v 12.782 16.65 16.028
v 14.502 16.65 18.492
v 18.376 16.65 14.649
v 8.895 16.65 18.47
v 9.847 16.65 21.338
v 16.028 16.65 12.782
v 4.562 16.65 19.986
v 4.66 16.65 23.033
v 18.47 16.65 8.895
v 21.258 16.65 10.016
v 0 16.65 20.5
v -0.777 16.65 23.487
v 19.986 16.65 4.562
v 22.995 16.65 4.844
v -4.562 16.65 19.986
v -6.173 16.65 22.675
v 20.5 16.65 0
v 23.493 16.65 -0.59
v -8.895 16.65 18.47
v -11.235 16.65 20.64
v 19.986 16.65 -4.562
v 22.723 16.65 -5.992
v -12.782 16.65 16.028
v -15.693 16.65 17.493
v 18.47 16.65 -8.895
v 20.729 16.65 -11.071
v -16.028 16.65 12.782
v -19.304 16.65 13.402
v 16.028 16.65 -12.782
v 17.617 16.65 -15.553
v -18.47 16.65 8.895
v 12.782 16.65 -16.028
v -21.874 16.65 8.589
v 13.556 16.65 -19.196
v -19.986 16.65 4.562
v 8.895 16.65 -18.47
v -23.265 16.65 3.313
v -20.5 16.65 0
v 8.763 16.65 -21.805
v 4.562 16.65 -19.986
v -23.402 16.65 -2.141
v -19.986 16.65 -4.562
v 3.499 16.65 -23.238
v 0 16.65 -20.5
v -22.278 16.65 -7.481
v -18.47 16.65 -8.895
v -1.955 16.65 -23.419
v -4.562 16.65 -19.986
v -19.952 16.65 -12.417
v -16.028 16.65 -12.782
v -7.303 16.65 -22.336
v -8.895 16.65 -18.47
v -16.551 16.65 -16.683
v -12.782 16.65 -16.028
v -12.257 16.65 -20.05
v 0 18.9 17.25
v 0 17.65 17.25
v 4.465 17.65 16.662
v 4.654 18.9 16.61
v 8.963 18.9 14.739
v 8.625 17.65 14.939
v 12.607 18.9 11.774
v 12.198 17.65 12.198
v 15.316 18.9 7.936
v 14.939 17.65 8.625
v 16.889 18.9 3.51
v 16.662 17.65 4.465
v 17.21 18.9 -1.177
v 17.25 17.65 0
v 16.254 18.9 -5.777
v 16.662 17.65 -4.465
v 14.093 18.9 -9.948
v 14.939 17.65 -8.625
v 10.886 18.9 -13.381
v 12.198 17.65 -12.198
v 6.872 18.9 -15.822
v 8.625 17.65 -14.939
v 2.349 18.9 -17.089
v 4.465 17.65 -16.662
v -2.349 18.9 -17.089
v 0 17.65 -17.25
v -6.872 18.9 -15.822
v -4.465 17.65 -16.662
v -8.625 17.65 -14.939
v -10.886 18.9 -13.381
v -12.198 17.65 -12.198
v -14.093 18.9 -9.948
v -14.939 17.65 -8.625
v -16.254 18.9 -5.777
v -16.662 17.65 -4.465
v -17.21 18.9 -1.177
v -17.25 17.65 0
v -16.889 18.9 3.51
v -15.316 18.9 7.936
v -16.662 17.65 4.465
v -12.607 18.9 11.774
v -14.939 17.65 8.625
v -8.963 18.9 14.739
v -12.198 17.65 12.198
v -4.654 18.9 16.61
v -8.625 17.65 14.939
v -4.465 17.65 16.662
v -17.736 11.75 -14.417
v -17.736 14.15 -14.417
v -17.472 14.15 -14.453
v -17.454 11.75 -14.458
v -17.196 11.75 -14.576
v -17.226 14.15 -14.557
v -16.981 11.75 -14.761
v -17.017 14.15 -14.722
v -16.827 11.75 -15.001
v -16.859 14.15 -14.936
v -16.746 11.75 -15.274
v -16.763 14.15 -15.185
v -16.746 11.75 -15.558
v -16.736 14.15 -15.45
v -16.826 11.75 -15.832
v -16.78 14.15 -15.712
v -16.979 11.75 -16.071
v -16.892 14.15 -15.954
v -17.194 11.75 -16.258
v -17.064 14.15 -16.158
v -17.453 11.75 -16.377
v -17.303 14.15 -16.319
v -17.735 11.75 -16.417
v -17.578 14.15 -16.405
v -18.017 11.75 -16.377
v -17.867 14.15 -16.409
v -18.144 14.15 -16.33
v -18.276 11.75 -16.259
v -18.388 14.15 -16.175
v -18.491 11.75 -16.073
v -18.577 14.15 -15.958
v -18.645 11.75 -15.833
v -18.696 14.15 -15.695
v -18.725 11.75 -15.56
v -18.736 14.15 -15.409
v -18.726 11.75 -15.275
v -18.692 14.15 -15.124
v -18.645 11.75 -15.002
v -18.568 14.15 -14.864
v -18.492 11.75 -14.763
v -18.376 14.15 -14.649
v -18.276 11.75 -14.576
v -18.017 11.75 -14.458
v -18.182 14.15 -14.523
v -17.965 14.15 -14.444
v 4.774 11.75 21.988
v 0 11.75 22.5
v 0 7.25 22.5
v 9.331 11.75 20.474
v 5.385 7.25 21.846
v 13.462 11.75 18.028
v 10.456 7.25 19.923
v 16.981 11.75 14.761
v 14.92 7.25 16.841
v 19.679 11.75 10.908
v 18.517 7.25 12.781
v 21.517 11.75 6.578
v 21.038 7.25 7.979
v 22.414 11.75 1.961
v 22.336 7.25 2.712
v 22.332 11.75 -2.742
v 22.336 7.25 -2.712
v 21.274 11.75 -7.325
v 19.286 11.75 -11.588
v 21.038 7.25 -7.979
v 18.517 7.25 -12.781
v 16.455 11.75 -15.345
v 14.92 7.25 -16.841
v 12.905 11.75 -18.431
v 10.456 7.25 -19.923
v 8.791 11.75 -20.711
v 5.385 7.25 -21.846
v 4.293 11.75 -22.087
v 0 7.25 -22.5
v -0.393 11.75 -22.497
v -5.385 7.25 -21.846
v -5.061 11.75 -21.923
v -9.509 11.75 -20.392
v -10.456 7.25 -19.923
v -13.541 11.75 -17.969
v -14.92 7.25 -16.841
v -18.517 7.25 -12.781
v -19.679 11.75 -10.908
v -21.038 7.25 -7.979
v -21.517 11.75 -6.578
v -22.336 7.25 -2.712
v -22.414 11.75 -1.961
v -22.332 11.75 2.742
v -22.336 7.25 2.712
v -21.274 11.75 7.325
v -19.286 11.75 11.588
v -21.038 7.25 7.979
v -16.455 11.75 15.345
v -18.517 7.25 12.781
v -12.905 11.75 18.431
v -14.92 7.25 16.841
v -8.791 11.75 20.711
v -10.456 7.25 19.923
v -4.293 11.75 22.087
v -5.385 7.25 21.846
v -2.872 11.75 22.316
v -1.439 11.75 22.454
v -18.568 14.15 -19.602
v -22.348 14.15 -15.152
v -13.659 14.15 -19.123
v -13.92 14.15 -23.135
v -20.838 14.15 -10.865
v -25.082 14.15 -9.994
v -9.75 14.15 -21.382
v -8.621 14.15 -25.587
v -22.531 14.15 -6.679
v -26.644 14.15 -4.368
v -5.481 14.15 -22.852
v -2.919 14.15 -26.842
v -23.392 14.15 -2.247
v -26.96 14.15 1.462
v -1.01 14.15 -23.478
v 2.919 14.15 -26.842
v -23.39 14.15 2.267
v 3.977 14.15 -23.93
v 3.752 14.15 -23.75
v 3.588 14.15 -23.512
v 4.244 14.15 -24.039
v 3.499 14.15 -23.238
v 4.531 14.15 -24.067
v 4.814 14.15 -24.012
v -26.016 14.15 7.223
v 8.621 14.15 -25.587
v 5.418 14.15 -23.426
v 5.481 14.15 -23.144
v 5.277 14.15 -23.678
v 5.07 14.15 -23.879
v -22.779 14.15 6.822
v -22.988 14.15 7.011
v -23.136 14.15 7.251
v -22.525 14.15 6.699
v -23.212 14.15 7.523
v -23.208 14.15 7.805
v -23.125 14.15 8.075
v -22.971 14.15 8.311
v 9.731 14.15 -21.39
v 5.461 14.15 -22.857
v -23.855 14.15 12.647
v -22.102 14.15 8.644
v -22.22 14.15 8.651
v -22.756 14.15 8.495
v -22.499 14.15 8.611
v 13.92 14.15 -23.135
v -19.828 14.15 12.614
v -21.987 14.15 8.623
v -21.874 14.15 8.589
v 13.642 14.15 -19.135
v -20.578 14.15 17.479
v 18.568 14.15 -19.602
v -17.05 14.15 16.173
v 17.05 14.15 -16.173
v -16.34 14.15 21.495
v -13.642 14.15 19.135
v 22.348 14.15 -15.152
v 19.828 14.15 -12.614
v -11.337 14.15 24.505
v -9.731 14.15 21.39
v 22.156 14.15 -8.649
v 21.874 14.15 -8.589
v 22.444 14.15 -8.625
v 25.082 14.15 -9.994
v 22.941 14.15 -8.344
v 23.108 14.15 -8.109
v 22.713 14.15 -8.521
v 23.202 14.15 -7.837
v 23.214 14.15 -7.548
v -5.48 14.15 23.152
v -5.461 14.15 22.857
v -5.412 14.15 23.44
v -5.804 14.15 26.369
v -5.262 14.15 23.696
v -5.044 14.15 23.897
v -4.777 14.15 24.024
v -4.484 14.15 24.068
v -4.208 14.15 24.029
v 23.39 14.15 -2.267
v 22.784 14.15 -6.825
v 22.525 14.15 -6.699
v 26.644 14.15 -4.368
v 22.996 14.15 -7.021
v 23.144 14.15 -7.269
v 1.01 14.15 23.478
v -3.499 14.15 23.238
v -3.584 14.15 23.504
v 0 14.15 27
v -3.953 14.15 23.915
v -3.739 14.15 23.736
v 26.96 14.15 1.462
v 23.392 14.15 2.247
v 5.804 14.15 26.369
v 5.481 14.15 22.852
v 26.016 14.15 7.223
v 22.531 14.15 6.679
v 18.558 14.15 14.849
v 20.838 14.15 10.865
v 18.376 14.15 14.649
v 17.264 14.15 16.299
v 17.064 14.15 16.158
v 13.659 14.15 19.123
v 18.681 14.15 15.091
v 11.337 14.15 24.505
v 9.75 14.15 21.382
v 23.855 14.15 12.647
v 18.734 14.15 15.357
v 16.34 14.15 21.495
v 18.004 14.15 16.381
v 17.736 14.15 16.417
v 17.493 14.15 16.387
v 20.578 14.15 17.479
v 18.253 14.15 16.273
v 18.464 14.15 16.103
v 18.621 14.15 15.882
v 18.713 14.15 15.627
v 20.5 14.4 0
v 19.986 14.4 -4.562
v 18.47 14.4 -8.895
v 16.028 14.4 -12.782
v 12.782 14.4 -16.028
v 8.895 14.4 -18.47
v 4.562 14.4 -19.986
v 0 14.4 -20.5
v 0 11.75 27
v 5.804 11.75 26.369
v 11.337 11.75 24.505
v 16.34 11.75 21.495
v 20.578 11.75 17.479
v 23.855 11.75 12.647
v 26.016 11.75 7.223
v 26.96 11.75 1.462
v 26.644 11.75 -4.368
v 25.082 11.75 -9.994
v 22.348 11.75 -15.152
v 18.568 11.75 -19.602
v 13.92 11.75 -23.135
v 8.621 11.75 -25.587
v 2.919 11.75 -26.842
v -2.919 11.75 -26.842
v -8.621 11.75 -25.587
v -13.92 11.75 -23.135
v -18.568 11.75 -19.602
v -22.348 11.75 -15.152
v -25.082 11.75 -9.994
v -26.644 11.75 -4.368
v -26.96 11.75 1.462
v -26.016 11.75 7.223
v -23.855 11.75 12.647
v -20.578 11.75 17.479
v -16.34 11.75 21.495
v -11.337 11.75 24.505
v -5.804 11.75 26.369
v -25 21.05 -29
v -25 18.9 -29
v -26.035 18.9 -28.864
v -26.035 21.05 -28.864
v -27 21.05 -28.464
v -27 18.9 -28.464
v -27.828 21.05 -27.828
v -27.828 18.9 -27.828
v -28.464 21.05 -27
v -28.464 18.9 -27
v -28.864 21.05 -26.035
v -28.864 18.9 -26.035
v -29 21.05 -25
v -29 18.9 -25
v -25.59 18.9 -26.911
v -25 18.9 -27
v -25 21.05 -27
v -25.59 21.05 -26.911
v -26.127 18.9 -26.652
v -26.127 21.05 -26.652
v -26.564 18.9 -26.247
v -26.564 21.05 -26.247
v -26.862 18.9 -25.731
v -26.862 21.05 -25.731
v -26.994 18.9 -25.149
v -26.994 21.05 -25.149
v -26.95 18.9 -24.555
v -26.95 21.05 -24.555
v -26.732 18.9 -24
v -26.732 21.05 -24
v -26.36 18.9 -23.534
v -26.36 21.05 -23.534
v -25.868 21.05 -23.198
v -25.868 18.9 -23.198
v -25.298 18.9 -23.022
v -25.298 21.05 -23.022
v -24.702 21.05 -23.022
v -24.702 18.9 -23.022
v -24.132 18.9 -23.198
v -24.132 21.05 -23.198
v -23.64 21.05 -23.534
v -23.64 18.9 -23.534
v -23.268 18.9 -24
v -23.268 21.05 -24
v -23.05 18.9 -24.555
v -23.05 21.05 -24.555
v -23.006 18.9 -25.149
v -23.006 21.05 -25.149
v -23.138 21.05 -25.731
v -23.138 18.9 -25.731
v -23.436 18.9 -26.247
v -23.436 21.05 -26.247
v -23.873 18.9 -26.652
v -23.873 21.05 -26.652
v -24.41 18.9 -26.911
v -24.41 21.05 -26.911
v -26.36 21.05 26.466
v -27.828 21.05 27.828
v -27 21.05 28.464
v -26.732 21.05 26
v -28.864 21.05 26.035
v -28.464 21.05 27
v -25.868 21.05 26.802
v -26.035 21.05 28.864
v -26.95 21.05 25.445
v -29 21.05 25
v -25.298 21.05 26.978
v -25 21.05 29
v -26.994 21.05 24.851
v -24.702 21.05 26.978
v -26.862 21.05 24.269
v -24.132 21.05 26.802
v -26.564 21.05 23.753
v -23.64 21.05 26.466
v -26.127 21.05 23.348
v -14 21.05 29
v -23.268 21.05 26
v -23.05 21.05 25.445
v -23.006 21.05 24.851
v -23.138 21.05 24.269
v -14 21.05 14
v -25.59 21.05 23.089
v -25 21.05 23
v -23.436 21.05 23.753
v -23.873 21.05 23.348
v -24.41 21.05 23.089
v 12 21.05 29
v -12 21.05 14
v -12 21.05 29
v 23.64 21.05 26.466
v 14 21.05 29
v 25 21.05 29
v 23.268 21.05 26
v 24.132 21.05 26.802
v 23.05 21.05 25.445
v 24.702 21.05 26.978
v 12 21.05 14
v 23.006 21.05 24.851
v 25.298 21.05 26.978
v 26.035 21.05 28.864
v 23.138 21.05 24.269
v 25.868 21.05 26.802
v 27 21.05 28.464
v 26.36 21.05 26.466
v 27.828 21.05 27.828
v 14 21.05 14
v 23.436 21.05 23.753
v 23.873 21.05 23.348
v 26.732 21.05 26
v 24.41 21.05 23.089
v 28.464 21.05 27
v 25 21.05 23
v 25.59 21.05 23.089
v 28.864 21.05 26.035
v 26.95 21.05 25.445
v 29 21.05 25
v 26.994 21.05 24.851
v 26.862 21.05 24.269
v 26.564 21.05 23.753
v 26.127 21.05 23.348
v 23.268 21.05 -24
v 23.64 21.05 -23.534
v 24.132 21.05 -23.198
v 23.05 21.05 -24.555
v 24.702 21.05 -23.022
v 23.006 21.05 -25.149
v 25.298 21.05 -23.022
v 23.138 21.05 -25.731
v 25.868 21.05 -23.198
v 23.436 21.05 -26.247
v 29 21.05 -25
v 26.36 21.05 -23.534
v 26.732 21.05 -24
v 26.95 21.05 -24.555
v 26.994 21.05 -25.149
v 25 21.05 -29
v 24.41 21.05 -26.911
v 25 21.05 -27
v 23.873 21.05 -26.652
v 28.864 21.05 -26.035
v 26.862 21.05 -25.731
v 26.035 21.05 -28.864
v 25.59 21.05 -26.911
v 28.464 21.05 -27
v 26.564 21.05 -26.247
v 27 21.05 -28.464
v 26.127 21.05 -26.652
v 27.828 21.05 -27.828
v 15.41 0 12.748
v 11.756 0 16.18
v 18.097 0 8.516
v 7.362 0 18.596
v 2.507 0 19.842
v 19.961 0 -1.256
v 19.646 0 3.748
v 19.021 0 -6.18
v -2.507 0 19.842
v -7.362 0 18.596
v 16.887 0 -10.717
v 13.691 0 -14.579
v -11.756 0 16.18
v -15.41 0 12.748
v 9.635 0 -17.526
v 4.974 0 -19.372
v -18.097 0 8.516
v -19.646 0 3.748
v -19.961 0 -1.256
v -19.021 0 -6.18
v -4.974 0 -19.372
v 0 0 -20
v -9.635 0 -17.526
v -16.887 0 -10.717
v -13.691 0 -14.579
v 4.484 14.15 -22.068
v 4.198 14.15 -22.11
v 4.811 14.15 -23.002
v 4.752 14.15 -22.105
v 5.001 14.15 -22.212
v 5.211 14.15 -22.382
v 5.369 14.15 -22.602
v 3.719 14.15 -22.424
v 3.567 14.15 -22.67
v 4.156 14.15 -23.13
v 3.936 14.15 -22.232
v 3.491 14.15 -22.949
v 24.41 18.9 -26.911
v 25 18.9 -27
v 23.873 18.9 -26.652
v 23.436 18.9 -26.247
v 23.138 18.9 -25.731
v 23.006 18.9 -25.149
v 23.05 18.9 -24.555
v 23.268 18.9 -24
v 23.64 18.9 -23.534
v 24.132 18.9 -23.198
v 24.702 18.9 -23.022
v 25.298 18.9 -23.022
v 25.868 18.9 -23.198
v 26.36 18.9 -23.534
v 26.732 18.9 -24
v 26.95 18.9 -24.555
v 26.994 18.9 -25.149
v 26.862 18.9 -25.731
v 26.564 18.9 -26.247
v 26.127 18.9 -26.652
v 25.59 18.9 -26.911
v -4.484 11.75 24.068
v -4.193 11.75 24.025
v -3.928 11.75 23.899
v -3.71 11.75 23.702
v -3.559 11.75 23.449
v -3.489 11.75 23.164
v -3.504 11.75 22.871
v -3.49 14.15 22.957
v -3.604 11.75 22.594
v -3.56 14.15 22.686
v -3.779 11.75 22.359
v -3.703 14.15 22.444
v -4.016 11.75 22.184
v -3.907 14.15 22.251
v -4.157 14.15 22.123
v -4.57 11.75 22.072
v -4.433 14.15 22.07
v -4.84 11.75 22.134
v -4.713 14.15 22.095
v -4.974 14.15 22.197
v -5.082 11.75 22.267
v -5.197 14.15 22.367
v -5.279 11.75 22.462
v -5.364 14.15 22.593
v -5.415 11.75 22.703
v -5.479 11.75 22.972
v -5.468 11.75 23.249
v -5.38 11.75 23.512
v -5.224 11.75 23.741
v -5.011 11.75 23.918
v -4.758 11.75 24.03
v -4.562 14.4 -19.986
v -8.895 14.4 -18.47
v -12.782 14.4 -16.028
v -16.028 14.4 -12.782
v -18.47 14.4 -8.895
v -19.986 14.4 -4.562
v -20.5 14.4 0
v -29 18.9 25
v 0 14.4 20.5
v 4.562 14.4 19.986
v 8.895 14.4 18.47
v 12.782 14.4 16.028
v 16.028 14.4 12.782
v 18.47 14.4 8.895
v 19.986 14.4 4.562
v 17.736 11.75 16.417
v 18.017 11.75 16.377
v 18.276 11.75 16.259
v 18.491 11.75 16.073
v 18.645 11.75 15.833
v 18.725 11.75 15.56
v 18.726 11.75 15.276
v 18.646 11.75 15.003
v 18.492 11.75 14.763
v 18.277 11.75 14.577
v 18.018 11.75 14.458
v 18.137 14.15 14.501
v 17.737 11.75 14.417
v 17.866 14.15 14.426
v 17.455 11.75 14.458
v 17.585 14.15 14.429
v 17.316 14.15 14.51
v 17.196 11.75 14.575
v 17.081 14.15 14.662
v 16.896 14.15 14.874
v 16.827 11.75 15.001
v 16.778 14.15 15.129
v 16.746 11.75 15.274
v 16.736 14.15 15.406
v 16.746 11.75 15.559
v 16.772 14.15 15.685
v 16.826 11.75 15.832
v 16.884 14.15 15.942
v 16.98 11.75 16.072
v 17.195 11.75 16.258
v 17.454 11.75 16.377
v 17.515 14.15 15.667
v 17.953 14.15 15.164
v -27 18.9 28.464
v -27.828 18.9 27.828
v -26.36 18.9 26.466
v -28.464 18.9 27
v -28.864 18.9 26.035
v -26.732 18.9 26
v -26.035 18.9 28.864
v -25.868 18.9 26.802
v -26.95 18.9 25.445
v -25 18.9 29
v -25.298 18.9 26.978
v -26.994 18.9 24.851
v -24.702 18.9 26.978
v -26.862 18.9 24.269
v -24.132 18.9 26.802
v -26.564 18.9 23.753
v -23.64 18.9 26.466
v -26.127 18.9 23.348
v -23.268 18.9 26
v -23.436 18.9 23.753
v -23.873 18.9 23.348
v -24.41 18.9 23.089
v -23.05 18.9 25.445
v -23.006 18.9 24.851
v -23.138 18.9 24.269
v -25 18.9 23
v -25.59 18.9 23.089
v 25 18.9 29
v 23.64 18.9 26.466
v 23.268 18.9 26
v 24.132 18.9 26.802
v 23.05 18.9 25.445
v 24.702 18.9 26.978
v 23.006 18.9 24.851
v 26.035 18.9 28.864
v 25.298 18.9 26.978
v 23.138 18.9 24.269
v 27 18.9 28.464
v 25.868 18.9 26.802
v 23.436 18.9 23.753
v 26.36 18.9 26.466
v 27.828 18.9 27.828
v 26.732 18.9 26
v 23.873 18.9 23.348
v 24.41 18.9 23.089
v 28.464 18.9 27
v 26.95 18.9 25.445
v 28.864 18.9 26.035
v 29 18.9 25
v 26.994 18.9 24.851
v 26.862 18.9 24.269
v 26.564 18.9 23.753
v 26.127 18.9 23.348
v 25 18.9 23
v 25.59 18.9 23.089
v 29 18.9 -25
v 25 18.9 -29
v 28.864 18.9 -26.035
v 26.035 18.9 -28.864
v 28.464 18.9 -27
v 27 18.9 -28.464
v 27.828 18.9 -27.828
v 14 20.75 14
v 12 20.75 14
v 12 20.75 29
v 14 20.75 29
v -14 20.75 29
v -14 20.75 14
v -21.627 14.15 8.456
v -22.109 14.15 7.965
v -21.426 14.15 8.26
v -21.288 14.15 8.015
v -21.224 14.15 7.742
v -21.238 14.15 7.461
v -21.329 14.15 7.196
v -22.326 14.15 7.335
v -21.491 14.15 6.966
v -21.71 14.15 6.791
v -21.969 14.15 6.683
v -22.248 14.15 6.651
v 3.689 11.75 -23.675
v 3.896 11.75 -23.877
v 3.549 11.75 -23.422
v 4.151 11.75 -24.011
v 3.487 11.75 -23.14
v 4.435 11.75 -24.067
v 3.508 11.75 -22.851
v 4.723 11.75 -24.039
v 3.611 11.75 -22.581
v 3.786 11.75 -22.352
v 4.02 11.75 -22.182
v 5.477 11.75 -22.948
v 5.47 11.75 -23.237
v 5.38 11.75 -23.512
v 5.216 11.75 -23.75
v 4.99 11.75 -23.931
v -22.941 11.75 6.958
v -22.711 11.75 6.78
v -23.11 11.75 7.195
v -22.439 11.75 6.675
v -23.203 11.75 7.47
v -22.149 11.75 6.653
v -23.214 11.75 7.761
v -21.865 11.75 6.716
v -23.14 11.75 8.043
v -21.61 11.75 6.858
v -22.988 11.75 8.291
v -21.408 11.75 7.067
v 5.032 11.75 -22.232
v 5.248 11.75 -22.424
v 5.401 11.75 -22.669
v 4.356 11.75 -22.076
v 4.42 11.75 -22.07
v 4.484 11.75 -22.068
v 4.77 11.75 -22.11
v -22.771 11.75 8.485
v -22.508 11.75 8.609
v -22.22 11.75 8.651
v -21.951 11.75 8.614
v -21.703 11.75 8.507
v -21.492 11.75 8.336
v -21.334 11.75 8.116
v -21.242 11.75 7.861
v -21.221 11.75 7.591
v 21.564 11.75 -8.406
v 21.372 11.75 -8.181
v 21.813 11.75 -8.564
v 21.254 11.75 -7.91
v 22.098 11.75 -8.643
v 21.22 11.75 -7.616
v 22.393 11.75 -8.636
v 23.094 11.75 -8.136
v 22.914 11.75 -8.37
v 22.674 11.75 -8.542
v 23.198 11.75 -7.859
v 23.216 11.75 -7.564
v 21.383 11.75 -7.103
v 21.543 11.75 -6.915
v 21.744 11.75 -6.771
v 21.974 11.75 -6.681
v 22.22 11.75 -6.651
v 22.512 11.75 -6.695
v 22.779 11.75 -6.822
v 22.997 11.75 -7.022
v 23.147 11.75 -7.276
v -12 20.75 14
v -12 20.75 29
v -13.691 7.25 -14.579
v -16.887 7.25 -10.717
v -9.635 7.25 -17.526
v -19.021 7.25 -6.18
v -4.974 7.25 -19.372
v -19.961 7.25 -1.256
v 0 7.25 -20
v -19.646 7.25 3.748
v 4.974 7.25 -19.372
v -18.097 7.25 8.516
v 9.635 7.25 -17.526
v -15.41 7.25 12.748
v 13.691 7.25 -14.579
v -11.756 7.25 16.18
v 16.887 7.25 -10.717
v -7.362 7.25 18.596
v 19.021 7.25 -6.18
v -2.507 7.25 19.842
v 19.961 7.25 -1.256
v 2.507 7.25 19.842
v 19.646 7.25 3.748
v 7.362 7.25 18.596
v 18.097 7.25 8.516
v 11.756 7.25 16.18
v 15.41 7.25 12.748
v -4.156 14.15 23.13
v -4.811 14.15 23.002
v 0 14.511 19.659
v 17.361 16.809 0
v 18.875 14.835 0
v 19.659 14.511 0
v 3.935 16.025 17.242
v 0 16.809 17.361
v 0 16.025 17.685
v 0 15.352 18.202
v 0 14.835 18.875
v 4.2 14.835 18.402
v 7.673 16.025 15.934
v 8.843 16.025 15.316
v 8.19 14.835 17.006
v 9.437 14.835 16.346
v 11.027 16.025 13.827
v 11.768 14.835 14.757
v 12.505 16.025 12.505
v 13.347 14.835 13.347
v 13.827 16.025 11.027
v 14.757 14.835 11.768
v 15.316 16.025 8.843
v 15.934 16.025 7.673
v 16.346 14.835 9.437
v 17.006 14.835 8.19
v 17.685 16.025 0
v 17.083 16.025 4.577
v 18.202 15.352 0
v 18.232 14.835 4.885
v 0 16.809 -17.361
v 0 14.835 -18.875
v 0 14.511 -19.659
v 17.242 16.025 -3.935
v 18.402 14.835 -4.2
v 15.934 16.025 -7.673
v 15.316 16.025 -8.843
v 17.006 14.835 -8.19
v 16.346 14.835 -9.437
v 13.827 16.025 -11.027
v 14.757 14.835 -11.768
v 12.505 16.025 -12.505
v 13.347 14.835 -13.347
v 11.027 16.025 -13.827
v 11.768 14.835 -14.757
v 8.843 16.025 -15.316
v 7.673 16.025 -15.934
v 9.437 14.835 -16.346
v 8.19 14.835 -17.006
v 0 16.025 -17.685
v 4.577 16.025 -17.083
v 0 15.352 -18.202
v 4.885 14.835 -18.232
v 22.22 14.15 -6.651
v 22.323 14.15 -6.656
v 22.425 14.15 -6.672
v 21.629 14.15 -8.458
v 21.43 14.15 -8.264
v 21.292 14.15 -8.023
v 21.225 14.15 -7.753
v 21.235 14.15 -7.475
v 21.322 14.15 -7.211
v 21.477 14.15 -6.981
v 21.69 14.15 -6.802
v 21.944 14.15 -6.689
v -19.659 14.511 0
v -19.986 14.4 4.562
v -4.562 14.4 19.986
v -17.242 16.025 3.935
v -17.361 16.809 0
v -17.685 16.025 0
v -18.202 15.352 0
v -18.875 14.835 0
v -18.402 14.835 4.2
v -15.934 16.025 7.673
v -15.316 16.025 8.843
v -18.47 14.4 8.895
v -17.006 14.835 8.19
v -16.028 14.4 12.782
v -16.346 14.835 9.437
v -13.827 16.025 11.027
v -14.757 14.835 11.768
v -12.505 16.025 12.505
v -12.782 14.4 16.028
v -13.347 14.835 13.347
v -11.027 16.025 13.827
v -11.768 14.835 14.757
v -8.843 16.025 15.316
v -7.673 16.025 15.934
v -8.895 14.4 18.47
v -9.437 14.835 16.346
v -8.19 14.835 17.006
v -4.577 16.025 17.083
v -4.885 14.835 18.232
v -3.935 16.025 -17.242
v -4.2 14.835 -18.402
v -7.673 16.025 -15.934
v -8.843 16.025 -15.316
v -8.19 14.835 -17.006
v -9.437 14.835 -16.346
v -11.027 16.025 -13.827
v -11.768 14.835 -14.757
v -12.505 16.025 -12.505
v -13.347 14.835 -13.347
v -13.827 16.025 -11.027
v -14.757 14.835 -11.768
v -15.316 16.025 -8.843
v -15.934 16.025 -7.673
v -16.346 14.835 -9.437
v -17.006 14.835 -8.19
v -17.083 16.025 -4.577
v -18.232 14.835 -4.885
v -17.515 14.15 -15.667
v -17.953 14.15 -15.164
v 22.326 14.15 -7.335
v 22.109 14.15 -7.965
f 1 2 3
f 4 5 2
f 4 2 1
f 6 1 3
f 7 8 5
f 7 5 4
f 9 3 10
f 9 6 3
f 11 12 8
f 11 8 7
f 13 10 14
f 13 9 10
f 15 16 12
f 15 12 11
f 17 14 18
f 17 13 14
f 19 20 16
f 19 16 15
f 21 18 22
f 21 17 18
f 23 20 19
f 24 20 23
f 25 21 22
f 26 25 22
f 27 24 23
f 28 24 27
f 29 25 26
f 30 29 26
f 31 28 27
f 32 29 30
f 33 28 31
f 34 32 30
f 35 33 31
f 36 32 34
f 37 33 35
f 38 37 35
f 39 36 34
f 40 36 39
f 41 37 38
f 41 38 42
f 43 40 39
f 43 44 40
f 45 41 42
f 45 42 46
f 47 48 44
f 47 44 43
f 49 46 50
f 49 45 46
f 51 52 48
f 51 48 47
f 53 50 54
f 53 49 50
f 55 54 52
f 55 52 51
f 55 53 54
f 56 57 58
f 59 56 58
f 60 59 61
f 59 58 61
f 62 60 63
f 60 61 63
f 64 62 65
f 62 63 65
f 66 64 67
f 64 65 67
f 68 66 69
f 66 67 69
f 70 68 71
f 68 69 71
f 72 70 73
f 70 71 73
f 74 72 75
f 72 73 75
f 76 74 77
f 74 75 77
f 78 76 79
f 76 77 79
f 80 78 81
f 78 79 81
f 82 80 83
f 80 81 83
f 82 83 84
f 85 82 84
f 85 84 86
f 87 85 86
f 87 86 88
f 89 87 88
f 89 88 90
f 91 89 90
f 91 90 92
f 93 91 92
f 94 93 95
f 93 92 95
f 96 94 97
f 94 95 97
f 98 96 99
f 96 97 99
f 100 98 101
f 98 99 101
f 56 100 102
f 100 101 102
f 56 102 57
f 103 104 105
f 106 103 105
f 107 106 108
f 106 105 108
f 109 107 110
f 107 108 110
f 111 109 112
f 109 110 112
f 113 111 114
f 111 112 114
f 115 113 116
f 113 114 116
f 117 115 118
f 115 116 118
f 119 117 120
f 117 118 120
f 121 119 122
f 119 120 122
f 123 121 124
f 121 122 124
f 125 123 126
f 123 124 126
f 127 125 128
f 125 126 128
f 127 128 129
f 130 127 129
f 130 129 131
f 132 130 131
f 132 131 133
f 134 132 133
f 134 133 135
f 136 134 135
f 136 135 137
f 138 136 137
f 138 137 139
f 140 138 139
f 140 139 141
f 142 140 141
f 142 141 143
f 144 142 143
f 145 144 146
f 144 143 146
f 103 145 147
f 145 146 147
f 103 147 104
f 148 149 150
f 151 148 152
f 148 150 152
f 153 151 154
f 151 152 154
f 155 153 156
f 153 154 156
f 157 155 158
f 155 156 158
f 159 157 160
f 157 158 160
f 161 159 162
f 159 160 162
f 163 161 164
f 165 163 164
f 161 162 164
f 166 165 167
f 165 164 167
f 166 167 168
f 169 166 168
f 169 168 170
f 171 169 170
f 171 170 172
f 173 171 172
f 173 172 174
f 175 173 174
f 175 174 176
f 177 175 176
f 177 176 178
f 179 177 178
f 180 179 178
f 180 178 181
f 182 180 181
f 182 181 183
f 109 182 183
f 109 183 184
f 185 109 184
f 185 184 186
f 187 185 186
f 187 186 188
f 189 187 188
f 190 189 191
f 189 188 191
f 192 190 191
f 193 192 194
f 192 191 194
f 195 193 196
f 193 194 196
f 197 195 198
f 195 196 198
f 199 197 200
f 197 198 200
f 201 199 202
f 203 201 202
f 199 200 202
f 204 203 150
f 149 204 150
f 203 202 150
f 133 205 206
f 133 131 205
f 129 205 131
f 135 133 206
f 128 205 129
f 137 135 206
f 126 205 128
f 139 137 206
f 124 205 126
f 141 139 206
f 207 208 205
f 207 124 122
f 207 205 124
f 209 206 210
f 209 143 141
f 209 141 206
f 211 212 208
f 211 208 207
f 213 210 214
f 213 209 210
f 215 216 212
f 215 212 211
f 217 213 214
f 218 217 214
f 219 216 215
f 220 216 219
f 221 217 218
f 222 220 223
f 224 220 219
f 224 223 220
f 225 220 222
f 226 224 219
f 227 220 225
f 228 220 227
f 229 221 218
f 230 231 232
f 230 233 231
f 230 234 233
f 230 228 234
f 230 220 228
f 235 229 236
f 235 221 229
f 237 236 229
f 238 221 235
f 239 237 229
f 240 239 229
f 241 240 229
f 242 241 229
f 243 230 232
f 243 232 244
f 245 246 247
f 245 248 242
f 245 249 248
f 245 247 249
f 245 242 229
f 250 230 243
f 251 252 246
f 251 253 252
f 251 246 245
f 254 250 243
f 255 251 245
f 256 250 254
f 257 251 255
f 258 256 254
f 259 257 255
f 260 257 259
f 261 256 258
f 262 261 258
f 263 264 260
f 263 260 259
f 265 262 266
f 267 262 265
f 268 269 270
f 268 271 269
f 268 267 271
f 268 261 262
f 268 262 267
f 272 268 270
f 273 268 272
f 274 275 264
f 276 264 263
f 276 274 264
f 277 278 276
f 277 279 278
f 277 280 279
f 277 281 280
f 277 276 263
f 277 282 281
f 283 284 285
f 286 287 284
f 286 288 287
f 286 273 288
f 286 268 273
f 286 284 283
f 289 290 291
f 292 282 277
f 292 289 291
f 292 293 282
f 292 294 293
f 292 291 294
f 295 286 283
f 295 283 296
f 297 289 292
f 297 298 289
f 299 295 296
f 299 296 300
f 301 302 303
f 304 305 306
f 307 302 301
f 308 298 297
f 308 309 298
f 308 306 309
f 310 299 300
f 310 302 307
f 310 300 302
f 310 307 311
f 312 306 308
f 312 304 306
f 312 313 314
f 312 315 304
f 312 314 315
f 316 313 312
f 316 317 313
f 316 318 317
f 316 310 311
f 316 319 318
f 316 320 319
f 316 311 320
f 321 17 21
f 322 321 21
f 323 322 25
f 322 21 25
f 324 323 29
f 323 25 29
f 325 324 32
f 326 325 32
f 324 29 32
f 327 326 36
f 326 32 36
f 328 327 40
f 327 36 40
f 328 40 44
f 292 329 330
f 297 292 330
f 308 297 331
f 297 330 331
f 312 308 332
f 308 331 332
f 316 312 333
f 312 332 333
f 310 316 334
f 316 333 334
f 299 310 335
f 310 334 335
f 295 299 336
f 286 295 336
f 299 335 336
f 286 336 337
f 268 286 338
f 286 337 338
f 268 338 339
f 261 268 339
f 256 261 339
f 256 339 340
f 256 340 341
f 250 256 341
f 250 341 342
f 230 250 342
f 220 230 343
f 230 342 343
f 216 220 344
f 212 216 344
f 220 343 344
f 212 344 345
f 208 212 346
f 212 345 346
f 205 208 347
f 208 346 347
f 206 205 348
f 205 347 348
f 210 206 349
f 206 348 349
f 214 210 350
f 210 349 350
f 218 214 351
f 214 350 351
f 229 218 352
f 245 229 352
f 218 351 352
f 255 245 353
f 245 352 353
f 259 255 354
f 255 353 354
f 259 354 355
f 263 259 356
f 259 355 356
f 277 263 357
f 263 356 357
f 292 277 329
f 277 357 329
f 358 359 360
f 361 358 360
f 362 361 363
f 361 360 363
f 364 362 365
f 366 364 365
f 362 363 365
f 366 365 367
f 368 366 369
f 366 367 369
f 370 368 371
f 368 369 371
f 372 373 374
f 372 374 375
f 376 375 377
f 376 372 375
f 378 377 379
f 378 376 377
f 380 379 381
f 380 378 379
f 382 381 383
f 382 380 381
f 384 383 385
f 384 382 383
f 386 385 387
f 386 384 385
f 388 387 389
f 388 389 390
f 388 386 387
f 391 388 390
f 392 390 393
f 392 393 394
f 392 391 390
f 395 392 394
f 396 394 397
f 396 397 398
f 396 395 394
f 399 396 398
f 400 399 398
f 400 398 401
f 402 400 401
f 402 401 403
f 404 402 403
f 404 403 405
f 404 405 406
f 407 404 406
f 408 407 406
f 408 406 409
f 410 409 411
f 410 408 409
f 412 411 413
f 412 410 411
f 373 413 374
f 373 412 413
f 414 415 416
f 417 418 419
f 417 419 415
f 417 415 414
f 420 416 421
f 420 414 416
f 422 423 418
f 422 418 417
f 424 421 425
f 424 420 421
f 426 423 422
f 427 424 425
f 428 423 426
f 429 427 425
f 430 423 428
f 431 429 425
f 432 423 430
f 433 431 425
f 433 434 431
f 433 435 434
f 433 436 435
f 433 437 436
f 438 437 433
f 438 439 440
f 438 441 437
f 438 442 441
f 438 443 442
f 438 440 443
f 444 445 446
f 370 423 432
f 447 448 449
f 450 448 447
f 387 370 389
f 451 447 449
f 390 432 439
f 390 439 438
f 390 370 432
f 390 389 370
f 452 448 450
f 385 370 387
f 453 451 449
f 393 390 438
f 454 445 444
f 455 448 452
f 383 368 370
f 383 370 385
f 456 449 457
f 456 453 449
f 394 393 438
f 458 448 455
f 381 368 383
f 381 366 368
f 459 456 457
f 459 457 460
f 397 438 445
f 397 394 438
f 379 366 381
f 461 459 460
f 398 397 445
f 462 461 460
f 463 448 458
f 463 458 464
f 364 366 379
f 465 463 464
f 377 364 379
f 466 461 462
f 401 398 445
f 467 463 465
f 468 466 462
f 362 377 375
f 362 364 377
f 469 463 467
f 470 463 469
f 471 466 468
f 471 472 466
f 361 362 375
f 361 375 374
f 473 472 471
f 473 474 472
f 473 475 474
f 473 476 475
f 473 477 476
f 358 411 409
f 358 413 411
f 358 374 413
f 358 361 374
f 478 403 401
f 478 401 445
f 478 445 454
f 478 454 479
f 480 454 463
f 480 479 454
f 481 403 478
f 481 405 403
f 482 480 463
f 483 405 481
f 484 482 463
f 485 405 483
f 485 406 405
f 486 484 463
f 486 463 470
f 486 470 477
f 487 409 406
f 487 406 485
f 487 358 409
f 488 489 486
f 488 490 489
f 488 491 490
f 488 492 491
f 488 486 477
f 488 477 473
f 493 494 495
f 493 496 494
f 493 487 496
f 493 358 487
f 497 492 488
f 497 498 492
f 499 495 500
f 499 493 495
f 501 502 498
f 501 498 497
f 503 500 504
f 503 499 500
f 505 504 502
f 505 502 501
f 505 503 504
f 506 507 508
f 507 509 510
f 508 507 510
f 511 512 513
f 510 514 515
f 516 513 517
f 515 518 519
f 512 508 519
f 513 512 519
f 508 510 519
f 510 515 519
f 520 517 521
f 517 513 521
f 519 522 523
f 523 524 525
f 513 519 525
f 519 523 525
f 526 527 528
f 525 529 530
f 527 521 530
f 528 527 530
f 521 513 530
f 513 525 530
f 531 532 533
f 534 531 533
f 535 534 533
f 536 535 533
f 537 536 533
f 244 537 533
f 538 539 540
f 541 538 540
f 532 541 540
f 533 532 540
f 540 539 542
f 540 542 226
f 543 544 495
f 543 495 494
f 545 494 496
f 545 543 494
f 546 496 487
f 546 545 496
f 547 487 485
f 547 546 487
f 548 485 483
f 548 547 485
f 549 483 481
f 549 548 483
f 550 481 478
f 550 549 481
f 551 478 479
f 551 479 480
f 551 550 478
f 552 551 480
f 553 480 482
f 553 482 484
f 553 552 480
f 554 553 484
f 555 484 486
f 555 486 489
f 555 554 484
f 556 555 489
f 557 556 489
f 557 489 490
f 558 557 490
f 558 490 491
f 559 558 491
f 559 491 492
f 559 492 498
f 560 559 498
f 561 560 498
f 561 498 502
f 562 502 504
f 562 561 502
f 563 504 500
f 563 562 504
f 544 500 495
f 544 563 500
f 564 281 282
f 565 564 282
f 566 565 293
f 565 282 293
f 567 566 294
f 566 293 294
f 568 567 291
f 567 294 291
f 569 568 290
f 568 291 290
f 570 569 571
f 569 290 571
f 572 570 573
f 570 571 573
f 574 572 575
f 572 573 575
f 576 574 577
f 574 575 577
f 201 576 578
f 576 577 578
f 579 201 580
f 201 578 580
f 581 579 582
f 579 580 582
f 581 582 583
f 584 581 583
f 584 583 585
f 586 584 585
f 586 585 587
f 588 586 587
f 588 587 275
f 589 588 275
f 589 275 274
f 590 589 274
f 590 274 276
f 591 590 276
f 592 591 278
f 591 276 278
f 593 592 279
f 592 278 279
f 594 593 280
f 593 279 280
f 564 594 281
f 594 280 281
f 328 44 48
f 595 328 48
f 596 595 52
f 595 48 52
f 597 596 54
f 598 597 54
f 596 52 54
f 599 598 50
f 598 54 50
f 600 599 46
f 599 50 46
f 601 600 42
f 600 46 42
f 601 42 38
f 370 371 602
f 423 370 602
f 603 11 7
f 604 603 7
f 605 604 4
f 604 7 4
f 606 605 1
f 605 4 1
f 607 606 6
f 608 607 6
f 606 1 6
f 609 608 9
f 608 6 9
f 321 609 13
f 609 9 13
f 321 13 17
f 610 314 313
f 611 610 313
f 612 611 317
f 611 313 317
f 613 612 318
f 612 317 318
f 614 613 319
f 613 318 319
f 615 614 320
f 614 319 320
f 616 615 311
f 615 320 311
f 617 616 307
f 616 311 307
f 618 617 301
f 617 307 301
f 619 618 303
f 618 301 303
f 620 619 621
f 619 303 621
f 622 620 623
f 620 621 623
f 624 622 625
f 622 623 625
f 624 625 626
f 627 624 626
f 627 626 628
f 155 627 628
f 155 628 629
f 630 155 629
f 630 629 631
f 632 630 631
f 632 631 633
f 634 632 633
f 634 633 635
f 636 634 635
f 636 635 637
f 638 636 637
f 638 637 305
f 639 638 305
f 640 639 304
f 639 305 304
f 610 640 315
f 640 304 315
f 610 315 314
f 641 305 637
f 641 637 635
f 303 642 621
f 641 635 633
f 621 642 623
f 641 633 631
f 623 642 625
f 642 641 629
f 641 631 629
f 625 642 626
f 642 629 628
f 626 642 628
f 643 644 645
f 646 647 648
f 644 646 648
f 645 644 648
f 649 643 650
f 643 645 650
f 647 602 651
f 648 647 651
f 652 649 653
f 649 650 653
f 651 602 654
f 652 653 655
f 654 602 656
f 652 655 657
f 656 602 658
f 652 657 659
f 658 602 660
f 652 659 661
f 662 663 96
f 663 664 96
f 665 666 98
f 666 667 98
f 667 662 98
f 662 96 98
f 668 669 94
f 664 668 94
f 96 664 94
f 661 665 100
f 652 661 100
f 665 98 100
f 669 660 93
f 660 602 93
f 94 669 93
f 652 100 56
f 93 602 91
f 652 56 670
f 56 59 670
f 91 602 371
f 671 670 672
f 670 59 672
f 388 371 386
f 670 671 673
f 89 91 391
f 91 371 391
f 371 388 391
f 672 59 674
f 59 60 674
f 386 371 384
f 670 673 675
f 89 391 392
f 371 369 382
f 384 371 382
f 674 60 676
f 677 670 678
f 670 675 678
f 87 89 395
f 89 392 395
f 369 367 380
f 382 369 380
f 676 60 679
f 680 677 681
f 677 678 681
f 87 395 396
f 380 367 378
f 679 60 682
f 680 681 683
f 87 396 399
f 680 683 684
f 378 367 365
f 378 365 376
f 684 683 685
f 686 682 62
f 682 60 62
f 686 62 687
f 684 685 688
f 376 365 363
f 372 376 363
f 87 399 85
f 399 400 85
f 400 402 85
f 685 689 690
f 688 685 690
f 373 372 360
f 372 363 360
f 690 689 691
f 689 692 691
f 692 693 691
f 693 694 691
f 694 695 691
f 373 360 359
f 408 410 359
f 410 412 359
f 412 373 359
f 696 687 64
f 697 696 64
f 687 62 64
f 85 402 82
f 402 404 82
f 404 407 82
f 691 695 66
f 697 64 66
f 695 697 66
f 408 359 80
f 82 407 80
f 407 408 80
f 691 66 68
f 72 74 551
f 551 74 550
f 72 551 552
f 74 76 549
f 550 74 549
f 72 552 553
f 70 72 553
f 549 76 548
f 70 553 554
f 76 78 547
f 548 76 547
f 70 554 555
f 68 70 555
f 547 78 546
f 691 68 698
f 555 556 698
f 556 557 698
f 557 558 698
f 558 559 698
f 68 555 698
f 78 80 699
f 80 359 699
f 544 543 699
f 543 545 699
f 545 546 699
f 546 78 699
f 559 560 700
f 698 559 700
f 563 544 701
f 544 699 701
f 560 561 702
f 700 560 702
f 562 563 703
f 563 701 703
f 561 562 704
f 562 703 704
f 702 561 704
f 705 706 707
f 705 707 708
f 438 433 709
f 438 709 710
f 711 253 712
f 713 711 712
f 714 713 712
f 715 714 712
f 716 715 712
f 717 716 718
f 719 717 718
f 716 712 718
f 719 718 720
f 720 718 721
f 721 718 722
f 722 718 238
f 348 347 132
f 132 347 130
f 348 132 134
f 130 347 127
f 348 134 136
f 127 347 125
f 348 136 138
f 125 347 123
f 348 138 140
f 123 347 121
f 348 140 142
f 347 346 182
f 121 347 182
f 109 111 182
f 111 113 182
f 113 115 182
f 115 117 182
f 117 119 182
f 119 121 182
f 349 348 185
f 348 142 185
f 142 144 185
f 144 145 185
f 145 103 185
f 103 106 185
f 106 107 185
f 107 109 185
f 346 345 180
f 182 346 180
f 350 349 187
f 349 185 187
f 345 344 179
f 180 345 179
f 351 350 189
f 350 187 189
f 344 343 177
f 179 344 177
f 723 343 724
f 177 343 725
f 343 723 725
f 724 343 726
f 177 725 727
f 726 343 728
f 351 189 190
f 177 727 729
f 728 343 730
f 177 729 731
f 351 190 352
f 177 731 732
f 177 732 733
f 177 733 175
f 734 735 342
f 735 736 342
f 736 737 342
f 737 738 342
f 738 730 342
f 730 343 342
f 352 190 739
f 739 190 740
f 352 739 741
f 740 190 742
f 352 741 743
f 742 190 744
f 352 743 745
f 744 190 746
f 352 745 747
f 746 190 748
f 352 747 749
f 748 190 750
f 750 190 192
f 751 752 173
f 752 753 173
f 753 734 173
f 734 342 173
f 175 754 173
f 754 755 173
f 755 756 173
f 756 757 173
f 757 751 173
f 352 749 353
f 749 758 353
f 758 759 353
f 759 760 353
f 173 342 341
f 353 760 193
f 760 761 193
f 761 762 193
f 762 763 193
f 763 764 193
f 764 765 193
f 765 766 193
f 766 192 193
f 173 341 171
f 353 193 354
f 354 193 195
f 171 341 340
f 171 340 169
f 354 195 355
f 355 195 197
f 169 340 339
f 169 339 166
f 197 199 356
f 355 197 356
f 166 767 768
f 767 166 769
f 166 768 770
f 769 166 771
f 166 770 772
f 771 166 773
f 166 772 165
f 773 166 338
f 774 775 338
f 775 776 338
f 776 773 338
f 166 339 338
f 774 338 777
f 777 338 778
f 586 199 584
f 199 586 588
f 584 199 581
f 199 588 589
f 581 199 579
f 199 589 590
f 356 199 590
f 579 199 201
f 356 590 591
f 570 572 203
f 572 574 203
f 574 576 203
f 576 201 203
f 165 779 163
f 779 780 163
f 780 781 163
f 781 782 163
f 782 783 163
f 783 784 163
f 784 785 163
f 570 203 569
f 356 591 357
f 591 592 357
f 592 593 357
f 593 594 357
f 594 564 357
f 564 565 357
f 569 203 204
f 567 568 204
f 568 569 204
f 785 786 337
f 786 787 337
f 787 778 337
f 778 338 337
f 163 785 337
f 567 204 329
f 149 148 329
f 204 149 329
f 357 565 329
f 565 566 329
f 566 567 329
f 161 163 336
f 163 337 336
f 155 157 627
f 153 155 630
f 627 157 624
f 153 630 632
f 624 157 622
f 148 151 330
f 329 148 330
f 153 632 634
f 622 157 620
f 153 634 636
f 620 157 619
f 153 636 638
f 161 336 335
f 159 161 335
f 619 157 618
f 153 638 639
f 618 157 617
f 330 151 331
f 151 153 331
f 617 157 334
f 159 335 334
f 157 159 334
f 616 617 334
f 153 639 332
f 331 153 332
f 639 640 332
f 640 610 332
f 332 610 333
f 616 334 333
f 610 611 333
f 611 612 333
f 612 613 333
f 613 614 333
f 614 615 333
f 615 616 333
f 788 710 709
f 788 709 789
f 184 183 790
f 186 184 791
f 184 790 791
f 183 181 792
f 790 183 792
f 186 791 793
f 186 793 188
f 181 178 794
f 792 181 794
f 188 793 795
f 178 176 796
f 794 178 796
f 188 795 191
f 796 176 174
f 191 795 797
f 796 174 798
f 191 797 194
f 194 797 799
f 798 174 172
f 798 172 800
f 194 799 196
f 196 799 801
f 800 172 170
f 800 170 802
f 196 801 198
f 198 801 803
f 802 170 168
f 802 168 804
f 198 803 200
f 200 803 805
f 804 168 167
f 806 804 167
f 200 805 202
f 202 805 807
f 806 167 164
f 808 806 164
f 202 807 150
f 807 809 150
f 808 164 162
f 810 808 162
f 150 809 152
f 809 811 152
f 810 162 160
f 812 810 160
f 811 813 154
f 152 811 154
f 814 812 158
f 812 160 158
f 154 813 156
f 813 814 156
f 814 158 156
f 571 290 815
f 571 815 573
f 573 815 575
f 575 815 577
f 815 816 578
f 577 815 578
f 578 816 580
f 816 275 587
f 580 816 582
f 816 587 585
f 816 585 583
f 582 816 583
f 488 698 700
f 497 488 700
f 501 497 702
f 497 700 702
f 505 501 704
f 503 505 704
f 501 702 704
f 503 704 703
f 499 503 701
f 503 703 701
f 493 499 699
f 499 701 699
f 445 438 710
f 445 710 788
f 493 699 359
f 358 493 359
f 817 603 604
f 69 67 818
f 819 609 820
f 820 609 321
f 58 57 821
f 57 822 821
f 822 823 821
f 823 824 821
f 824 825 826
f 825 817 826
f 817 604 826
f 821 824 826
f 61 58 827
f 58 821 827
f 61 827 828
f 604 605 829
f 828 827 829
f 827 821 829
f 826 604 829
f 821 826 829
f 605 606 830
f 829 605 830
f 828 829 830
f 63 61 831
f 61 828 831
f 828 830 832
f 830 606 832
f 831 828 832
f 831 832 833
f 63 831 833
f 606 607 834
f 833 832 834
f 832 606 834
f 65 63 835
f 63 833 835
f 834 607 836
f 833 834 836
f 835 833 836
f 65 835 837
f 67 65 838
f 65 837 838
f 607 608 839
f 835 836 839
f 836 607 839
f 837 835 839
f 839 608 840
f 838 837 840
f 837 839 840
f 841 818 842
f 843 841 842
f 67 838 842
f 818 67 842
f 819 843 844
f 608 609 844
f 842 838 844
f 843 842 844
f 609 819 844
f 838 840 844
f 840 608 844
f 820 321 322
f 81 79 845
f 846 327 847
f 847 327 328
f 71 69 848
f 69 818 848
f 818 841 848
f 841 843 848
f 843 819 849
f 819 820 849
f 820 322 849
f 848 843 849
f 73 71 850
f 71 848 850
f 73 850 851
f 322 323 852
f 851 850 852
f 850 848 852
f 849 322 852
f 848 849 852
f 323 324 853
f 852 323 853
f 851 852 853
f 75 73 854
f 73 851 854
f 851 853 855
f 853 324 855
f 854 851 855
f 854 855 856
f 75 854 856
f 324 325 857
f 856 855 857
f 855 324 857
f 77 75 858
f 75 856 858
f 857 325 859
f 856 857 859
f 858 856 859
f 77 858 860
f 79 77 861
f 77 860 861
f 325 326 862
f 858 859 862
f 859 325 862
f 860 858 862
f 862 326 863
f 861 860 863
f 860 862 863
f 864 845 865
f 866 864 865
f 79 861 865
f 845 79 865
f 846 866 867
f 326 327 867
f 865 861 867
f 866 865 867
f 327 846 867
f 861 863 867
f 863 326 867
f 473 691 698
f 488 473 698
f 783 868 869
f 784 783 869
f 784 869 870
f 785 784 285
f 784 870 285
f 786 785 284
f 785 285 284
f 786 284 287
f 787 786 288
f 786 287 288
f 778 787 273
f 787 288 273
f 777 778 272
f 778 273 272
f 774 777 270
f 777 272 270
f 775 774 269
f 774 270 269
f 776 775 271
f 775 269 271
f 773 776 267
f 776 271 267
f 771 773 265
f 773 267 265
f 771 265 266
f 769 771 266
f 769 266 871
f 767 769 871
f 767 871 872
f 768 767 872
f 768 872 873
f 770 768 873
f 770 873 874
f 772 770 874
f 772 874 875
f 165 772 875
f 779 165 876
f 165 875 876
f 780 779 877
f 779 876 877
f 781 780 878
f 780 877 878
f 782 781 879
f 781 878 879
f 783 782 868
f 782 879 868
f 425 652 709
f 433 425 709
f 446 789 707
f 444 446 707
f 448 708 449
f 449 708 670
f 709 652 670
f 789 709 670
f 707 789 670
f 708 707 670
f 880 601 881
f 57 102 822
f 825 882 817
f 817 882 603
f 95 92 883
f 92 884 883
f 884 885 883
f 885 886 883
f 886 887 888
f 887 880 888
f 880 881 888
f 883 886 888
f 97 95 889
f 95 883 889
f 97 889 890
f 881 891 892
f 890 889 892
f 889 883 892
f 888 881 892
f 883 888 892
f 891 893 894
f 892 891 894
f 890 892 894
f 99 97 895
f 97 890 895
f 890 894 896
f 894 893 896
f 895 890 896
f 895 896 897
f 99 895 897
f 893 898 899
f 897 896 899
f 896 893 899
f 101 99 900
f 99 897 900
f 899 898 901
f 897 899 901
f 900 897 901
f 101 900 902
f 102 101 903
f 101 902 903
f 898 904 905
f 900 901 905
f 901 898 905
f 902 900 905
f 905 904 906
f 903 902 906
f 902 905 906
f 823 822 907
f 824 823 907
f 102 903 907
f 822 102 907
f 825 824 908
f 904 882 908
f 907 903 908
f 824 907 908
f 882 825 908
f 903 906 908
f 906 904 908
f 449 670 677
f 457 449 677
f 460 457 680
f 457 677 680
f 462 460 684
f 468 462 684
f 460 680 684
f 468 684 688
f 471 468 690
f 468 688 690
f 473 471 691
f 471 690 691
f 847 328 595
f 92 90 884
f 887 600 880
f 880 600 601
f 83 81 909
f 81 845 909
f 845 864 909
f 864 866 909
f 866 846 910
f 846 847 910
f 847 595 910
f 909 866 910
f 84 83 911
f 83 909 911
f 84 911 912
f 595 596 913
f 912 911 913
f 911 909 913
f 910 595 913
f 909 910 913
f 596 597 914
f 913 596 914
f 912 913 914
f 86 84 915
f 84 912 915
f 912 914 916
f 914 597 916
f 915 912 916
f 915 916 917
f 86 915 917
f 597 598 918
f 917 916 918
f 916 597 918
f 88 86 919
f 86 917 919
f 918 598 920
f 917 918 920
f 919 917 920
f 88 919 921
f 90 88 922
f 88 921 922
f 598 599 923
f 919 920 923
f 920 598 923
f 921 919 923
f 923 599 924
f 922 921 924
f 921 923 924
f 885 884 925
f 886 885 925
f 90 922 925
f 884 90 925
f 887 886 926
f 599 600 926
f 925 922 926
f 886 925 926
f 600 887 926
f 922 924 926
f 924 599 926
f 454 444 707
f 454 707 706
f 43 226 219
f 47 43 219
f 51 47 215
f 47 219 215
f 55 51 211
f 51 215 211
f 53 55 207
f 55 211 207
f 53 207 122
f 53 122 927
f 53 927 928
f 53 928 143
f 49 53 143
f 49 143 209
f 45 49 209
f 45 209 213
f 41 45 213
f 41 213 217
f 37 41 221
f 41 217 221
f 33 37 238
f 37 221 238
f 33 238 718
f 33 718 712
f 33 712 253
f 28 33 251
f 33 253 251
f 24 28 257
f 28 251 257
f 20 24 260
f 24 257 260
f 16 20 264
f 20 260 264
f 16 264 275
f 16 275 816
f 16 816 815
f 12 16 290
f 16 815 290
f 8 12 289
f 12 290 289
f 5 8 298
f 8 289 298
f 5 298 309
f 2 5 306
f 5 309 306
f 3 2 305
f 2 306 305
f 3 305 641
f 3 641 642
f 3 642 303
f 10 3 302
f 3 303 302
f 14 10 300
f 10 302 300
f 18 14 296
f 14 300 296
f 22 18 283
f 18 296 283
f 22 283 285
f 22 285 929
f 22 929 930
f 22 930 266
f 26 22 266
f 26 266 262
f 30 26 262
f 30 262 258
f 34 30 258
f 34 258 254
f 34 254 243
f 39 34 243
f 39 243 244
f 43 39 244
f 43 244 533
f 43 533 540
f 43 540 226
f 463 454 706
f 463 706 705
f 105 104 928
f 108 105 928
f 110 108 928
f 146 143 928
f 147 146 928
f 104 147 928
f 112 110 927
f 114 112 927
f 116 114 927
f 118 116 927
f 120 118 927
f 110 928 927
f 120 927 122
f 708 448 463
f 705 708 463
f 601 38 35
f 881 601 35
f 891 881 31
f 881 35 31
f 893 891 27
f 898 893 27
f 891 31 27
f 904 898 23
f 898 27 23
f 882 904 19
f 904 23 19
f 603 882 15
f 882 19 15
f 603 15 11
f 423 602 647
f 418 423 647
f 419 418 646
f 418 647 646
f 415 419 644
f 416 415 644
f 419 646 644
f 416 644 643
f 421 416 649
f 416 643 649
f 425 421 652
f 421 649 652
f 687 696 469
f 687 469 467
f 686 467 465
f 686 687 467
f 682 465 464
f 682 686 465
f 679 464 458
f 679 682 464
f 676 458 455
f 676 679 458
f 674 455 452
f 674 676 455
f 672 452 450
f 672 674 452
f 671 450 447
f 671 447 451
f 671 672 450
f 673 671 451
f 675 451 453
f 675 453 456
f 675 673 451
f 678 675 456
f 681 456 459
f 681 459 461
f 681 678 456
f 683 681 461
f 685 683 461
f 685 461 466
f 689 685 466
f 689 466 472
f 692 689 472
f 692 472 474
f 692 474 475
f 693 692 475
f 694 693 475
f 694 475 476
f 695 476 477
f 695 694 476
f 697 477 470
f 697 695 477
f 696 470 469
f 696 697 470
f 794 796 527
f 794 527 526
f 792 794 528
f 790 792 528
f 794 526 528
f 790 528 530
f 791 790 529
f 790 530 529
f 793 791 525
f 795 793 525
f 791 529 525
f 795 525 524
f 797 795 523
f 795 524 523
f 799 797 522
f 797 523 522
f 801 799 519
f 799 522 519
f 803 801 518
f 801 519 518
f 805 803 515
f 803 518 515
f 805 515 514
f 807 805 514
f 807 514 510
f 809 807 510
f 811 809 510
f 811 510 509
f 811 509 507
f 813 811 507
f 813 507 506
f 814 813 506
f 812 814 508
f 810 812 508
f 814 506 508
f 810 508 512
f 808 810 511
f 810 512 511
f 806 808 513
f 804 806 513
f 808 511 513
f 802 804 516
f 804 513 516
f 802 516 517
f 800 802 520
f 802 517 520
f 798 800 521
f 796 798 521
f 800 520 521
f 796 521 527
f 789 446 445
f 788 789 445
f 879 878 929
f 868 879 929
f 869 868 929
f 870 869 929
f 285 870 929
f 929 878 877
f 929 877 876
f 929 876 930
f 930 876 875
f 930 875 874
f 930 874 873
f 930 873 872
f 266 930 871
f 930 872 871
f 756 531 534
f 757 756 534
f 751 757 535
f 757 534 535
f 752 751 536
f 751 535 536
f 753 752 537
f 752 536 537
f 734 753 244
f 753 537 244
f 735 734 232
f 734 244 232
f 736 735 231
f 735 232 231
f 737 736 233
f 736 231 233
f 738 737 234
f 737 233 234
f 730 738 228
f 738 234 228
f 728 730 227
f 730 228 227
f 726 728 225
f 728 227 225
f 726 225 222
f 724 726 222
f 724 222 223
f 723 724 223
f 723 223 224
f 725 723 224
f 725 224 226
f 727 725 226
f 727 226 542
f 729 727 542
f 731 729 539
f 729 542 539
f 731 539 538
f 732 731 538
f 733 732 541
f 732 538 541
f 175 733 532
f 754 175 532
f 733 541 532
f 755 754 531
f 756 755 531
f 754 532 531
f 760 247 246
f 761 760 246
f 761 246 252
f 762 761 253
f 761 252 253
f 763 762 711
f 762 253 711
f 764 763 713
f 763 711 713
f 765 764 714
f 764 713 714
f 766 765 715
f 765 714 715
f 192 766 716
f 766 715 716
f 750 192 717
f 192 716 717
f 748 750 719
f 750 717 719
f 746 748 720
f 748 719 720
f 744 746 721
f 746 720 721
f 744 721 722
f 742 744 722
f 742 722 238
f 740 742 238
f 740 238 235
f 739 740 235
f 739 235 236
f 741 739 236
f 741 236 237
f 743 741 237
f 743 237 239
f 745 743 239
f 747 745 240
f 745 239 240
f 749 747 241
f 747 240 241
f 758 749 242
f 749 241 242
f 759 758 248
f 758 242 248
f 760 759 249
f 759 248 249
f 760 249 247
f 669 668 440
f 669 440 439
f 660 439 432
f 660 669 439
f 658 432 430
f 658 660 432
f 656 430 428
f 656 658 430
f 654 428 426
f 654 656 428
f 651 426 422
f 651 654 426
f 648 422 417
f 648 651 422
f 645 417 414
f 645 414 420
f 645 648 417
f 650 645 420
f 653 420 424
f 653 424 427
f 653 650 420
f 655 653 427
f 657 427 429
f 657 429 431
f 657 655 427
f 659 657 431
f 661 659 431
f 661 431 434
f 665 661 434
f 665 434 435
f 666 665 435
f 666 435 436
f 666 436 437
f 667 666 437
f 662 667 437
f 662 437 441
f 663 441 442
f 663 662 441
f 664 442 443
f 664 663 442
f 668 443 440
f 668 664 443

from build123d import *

# Parameters (mm, degrees)
SKETCH1_R            = 20
BOSS_EXTRUDE1_DEPTH  = 7.25
SKETCH2_R            = 22.5
BOSS_EXTRUDE2_DEPTH  = 4.5
SKETCH3_R            = 27
BOSS_EXTRUDE3_DEPTH  = 2.4
CUT_EXTRUDE1_REACH   = 42.721
SKETCH4_R            = 1
SKETCH5_R            = 23.5
BOSS_EXTRUDE4_DEPTH  = 2.5
SKETCH6_R            = 20.5
BOSS_EXTRUDE5_DEPTH  = 1
SKETCH8_R            = 17.25
BOSS_EXTRUDE8_DEPTH  = 1.25
SKETCH10_R           = 2
BOSS_EXTRUDE10_DEPTH = 2.15
SKETCH11_W           = 2
SKETCH11_H           = 15
CUT_EXTRUDE2_DEPTH   = 0.3


with BuildPart() as part:
    # Sketch1 → Boss-Extrude1 (new body)
    with BuildSketch(Plane(origin=(0, 0, 0), x_dir=(1, 0, 0), z_dir=(0, 1, 0))):
        with Locations(Location((0, 0, 0), (0, 0, 90))):
            Circle(SKETCH1_R)
    extrude(amount=BOSS_EXTRUDE1_DEPTH)

    # Sketch2 → Boss-Extrude2 (add)
    with BuildSketch(Plane(origin=(0, 7.25, 0), x_dir=(1, 0, 0), z_dir=(0, 1, 0))):
        with Locations(Location((0, 0, 0), (0, 0, 270))):
            Circle(SKETCH2_R)
    extrude(amount=BOSS_EXTRUDE2_DEPTH)

    # Sketch3 → Boss-Extrude3 (add)
    with BuildSketch(Plane(origin=(0, 11.75, 0), x_dir=(1, 0, 0), z_dir=(0, 1, 0))):
        with Locations(Location((0, 0, 0), (0, 0, 270))):
            Circle(SKETCH3_R)
    extrude(amount=BOSS_EXTRUDE3_DEPTH)

    # Sketch4 → Cut-Extrude1 (cut, up to next)
    with BuildSketch(Plane(origin=(0, 14.15, 0), x_dir=(1, 0, 0), z_dir=(0, 1, 0)), mode=Mode.PRIVATE) as cut_extrude1_sk1:
        with Locations(Location((17.735675135, -15.417387181, 0), (0, 0, 270))):
            Circle(SKETCH4_R)
    cut_extrude1_tool1 = extrude(cut_extrude1_sk1.sketch, amount=-CUT_EXTRUDE1_REACH, mode=Mode.PRIVATE) & part.part
    # Sketch4 → Cut-Extrude1 (cut, up to next)
    with BuildSketch(Plane(origin=(0, 14.15, 0), x_dir=(1, 0, 0), z_dir=(0, 1, 0)), mode=Mode.PRIVATE) as cut_extrude1_sk2:
        with Locations(Location((-4.484011391, -23.068238811, 0), (0, 0, 270))):
            Circle(SKETCH4_R)
    cut_extrude1_tool2 = extrude(cut_extrude1_sk2.sketch, amount=-CUT_EXTRUDE1_REACH, mode=Mode.PRIVATE) & part.part
    # Sketch4 → Cut-Extrude1 (cut, up to next)
    with BuildSketch(Plane(origin=(0, 14.15, 0), x_dir=(1, 0, 0), z_dir=(0, 1, 0)), mode=Mode.PRIVATE) as cut_extrude1_sk3:
        with Locations(Location((-22.219686527, -7.65085163, 0), (0, 0, 270))):
            Circle(SKETCH4_R)
    cut_extrude1_tool3 = extrude(cut_extrude1_sk3.sketch, amount=-CUT_EXTRUDE1_REACH, mode=Mode.PRIVATE) & part.part
    # Sketch4 → Cut-Extrude1 (cut, up to next)
    with BuildSketch(Plane(origin=(0, 14.15, 0), x_dir=(1, 0, 0), z_dir=(0, 1, 0)), mode=Mode.PRIVATE) as cut_extrude1_sk4:
        with Locations(Location((-17.735675135, 15.417387181, 0), (0, 0, 270))):
            Circle(SKETCH4_R)
    cut_extrude1_tool4 = extrude(cut_extrude1_sk4.sketch, amount=-CUT_EXTRUDE1_REACH, mode=Mode.PRIVATE) & part.part
    # Sketch4 → Cut-Extrude1 (cut, up to next)
    with BuildSketch(Plane(origin=(0, 14.15, 0), x_dir=(1, 0, 0), z_dir=(0, 1, 0)), mode=Mode.PRIVATE) as cut_extrude1_sk5:
        with Locations(Location((4.484011391, 23.068238811, 0), (0, 0, 270))):
            Circle(SKETCH4_R)
    cut_extrude1_tool5 = extrude(cut_extrude1_sk5.sketch, amount=-CUT_EXTRUDE1_REACH, mode=Mode.PRIVATE) & part.part
    # Sketch4 → Cut-Extrude1 (cut, up to next)
    with BuildSketch(Plane(origin=(0, 14.15, 0), x_dir=(1, 0, 0), z_dir=(0, 1, 0)), mode=Mode.PRIVATE) as cut_extrude1_sk6:
        with Locations(Location((22.219686527, 7.65085163, 0), (0, 0, 270))):
            Circle(SKETCH4_R)
    cut_extrude1_tool6 = extrude(cut_extrude1_sk6.sketch, amount=-CUT_EXTRUDE1_REACH, mode=Mode.PRIVATE) & part.part
    add(cut_extrude1_tool1.solids().sort_by_distance((17.735675, 14.15, 15.417387))[0], mode=Mode.SUBTRACT)
    add(cut_extrude1_tool2.solids().sort_by_distance((-4.484011, 14.15, 23.068239))[0], mode=Mode.SUBTRACT)
    add(cut_extrude1_tool3.solids().sort_by_distance((-22.219687, 14.15, 7.650852))[0], mode=Mode.SUBTRACT)
    add(cut_extrude1_tool4.solids().sort_by_distance((-17.735675, 14.15, -15.417387))[0], mode=Mode.SUBTRACT)
    add(cut_extrude1_tool5.solids().sort_by_distance((4.484011, 14.15, -23.068239))[0], mode=Mode.SUBTRACT)
    add(cut_extrude1_tool6.solids().sort_by_distance((22.219687, 14.15, -7.650852))[0], mode=Mode.SUBTRACT)

    # Sketch5 → Boss-Extrude4 (add)
    with BuildSketch(Plane(origin=(0, 14.15, 0), x_dir=(1, 0, 0), z_dir=(0, 1, 0))):
        with Locations(Location((0, 0, 0), (0, 0, 81.438302268))):
            Circle(SKETCH5_R)
    extrude(amount=BOSS_EXTRUDE4_DEPTH)

    # Sketch6 → Boss-Extrude5 (add)
    with BuildSketch(Plane(origin=(0, 16.65, 0), x_dir=(1, 0, 0), z_dir=(0, 1, 0))):
        with Locations(Location((0, 0, 0), (0, 0, 270))):
            Circle(SKETCH6_R)
    extrude(amount=BOSS_EXTRUDE5_DEPTH)

    # Cut-Sweep1: sweep along a curve in space
    with BuildLine() as cut_sweep1_path:
        ThreePointArc((0, 17.65, 20.5), (14.495689014, 17.65, 14.495689014), (20.5, 17.65, 0))
        ThreePointArc((20.5, 17.65, 0), (14.495689014, 17.65, -14.495689014), (0, 17.65, -20.5))
        ThreePointArc((0, 17.65, -20.5), (-14.495689014, 17.65, -14.495689014), (-20.5, 17.65, 0))
        ThreePointArc((-20.5, 17.65, 0), (-14.495689014, 17.65, 14.495689014), (0, 17.65, 20.5))
    # Sketch7 → Cut-Sweep1 (sweep, cut)
    with BuildSketch(Plane.XY):
        with BuildLine():
            Line((20.5, 17.65), (20.5, 14.4))
            ThreePointArc((20.5, 14.4), (18.201902961, 15.351902961), (17.25, 17.65))
            Line((17.25, 17.65), (20.5, 17.65))
        make_face()
    sweep(path=cut_sweep1_path.line, mode=Mode.SUBTRACT)

    # Sketch8 → Boss-Extrude8 (add)
    with BuildSketch(Plane(origin=(0, 17.65, 0), x_dir=(1, 0, 0), z_dir=(0, 1, 0))):
        with Locations(Location((0, 0, 0), (0, 0, 270))):
            Circle(SKETCH8_R)
    extrude(amount=BOSS_EXTRUDE8_DEPTH)

    # Sketch10 → Boss-Extrude10 (add)
    with BuildSketch(Plane(origin=(0, 18.9, 0), x_dir=(1, 0, 0), z_dir=(0, 1, 0))):
        with BuildLine():
            Line((-25, -29), (25, -29))
            ThreePointArc((25, -29), (27.828427125, -27.828427125), (29, -25))
            Line((29, -25), (29, 25))
            ThreePointArc((29, 25), (27.828427125, 27.828427125), (25, 29))
            Line((25, 29), (-25, 29))
            ThreePointArc((-25, 29), (-27.828427125, 27.828427125), (-29, 25))
            Line((-29, 25), (-29, -25))
            ThreePointArc((-29, -25), (-27.828427125, -27.828427125), (-25, -29))
        make_face()
        with Locations(Location((-25, 25, 0), (0, 0, 90))):
            Circle(SKETCH10_R, mode=Mode.SUBTRACT)
        with Locations(Location((25, 25, 0), (0, 0, 90))):
            Circle(SKETCH10_R, mode=Mode.SUBTRACT)
        with Locations(Location((25, -25, 0), (0, 0, 90))):
            Circle(SKETCH10_R, mode=Mode.SUBTRACT)
        with Locations(Location((-25, -25, 0), (0, 0, 90))):
            Circle(SKETCH10_R, mode=Mode.SUBTRACT)
    extrude(amount=BOSS_EXTRUDE10_DEPTH)

    # Sketch11 → Cut-Extrude2 (cut)
    with BuildSketch(Plane(origin=(0, 21.05, 0), x_dir=(1, 0, 0), z_dir=(0, 1, 0))):
        with Locations((-13, -21.5)):
            Rectangle(SKETCH11_W, SKETCH11_H)
        with Locations((13, -21.5)):
            Rectangle(SKETCH11_W, SKETCH11_H)
    extrude(amount=-CUT_EXTRUDE2_DEPTH, mode=Mode.SUBTRACT)


solid = part.part
